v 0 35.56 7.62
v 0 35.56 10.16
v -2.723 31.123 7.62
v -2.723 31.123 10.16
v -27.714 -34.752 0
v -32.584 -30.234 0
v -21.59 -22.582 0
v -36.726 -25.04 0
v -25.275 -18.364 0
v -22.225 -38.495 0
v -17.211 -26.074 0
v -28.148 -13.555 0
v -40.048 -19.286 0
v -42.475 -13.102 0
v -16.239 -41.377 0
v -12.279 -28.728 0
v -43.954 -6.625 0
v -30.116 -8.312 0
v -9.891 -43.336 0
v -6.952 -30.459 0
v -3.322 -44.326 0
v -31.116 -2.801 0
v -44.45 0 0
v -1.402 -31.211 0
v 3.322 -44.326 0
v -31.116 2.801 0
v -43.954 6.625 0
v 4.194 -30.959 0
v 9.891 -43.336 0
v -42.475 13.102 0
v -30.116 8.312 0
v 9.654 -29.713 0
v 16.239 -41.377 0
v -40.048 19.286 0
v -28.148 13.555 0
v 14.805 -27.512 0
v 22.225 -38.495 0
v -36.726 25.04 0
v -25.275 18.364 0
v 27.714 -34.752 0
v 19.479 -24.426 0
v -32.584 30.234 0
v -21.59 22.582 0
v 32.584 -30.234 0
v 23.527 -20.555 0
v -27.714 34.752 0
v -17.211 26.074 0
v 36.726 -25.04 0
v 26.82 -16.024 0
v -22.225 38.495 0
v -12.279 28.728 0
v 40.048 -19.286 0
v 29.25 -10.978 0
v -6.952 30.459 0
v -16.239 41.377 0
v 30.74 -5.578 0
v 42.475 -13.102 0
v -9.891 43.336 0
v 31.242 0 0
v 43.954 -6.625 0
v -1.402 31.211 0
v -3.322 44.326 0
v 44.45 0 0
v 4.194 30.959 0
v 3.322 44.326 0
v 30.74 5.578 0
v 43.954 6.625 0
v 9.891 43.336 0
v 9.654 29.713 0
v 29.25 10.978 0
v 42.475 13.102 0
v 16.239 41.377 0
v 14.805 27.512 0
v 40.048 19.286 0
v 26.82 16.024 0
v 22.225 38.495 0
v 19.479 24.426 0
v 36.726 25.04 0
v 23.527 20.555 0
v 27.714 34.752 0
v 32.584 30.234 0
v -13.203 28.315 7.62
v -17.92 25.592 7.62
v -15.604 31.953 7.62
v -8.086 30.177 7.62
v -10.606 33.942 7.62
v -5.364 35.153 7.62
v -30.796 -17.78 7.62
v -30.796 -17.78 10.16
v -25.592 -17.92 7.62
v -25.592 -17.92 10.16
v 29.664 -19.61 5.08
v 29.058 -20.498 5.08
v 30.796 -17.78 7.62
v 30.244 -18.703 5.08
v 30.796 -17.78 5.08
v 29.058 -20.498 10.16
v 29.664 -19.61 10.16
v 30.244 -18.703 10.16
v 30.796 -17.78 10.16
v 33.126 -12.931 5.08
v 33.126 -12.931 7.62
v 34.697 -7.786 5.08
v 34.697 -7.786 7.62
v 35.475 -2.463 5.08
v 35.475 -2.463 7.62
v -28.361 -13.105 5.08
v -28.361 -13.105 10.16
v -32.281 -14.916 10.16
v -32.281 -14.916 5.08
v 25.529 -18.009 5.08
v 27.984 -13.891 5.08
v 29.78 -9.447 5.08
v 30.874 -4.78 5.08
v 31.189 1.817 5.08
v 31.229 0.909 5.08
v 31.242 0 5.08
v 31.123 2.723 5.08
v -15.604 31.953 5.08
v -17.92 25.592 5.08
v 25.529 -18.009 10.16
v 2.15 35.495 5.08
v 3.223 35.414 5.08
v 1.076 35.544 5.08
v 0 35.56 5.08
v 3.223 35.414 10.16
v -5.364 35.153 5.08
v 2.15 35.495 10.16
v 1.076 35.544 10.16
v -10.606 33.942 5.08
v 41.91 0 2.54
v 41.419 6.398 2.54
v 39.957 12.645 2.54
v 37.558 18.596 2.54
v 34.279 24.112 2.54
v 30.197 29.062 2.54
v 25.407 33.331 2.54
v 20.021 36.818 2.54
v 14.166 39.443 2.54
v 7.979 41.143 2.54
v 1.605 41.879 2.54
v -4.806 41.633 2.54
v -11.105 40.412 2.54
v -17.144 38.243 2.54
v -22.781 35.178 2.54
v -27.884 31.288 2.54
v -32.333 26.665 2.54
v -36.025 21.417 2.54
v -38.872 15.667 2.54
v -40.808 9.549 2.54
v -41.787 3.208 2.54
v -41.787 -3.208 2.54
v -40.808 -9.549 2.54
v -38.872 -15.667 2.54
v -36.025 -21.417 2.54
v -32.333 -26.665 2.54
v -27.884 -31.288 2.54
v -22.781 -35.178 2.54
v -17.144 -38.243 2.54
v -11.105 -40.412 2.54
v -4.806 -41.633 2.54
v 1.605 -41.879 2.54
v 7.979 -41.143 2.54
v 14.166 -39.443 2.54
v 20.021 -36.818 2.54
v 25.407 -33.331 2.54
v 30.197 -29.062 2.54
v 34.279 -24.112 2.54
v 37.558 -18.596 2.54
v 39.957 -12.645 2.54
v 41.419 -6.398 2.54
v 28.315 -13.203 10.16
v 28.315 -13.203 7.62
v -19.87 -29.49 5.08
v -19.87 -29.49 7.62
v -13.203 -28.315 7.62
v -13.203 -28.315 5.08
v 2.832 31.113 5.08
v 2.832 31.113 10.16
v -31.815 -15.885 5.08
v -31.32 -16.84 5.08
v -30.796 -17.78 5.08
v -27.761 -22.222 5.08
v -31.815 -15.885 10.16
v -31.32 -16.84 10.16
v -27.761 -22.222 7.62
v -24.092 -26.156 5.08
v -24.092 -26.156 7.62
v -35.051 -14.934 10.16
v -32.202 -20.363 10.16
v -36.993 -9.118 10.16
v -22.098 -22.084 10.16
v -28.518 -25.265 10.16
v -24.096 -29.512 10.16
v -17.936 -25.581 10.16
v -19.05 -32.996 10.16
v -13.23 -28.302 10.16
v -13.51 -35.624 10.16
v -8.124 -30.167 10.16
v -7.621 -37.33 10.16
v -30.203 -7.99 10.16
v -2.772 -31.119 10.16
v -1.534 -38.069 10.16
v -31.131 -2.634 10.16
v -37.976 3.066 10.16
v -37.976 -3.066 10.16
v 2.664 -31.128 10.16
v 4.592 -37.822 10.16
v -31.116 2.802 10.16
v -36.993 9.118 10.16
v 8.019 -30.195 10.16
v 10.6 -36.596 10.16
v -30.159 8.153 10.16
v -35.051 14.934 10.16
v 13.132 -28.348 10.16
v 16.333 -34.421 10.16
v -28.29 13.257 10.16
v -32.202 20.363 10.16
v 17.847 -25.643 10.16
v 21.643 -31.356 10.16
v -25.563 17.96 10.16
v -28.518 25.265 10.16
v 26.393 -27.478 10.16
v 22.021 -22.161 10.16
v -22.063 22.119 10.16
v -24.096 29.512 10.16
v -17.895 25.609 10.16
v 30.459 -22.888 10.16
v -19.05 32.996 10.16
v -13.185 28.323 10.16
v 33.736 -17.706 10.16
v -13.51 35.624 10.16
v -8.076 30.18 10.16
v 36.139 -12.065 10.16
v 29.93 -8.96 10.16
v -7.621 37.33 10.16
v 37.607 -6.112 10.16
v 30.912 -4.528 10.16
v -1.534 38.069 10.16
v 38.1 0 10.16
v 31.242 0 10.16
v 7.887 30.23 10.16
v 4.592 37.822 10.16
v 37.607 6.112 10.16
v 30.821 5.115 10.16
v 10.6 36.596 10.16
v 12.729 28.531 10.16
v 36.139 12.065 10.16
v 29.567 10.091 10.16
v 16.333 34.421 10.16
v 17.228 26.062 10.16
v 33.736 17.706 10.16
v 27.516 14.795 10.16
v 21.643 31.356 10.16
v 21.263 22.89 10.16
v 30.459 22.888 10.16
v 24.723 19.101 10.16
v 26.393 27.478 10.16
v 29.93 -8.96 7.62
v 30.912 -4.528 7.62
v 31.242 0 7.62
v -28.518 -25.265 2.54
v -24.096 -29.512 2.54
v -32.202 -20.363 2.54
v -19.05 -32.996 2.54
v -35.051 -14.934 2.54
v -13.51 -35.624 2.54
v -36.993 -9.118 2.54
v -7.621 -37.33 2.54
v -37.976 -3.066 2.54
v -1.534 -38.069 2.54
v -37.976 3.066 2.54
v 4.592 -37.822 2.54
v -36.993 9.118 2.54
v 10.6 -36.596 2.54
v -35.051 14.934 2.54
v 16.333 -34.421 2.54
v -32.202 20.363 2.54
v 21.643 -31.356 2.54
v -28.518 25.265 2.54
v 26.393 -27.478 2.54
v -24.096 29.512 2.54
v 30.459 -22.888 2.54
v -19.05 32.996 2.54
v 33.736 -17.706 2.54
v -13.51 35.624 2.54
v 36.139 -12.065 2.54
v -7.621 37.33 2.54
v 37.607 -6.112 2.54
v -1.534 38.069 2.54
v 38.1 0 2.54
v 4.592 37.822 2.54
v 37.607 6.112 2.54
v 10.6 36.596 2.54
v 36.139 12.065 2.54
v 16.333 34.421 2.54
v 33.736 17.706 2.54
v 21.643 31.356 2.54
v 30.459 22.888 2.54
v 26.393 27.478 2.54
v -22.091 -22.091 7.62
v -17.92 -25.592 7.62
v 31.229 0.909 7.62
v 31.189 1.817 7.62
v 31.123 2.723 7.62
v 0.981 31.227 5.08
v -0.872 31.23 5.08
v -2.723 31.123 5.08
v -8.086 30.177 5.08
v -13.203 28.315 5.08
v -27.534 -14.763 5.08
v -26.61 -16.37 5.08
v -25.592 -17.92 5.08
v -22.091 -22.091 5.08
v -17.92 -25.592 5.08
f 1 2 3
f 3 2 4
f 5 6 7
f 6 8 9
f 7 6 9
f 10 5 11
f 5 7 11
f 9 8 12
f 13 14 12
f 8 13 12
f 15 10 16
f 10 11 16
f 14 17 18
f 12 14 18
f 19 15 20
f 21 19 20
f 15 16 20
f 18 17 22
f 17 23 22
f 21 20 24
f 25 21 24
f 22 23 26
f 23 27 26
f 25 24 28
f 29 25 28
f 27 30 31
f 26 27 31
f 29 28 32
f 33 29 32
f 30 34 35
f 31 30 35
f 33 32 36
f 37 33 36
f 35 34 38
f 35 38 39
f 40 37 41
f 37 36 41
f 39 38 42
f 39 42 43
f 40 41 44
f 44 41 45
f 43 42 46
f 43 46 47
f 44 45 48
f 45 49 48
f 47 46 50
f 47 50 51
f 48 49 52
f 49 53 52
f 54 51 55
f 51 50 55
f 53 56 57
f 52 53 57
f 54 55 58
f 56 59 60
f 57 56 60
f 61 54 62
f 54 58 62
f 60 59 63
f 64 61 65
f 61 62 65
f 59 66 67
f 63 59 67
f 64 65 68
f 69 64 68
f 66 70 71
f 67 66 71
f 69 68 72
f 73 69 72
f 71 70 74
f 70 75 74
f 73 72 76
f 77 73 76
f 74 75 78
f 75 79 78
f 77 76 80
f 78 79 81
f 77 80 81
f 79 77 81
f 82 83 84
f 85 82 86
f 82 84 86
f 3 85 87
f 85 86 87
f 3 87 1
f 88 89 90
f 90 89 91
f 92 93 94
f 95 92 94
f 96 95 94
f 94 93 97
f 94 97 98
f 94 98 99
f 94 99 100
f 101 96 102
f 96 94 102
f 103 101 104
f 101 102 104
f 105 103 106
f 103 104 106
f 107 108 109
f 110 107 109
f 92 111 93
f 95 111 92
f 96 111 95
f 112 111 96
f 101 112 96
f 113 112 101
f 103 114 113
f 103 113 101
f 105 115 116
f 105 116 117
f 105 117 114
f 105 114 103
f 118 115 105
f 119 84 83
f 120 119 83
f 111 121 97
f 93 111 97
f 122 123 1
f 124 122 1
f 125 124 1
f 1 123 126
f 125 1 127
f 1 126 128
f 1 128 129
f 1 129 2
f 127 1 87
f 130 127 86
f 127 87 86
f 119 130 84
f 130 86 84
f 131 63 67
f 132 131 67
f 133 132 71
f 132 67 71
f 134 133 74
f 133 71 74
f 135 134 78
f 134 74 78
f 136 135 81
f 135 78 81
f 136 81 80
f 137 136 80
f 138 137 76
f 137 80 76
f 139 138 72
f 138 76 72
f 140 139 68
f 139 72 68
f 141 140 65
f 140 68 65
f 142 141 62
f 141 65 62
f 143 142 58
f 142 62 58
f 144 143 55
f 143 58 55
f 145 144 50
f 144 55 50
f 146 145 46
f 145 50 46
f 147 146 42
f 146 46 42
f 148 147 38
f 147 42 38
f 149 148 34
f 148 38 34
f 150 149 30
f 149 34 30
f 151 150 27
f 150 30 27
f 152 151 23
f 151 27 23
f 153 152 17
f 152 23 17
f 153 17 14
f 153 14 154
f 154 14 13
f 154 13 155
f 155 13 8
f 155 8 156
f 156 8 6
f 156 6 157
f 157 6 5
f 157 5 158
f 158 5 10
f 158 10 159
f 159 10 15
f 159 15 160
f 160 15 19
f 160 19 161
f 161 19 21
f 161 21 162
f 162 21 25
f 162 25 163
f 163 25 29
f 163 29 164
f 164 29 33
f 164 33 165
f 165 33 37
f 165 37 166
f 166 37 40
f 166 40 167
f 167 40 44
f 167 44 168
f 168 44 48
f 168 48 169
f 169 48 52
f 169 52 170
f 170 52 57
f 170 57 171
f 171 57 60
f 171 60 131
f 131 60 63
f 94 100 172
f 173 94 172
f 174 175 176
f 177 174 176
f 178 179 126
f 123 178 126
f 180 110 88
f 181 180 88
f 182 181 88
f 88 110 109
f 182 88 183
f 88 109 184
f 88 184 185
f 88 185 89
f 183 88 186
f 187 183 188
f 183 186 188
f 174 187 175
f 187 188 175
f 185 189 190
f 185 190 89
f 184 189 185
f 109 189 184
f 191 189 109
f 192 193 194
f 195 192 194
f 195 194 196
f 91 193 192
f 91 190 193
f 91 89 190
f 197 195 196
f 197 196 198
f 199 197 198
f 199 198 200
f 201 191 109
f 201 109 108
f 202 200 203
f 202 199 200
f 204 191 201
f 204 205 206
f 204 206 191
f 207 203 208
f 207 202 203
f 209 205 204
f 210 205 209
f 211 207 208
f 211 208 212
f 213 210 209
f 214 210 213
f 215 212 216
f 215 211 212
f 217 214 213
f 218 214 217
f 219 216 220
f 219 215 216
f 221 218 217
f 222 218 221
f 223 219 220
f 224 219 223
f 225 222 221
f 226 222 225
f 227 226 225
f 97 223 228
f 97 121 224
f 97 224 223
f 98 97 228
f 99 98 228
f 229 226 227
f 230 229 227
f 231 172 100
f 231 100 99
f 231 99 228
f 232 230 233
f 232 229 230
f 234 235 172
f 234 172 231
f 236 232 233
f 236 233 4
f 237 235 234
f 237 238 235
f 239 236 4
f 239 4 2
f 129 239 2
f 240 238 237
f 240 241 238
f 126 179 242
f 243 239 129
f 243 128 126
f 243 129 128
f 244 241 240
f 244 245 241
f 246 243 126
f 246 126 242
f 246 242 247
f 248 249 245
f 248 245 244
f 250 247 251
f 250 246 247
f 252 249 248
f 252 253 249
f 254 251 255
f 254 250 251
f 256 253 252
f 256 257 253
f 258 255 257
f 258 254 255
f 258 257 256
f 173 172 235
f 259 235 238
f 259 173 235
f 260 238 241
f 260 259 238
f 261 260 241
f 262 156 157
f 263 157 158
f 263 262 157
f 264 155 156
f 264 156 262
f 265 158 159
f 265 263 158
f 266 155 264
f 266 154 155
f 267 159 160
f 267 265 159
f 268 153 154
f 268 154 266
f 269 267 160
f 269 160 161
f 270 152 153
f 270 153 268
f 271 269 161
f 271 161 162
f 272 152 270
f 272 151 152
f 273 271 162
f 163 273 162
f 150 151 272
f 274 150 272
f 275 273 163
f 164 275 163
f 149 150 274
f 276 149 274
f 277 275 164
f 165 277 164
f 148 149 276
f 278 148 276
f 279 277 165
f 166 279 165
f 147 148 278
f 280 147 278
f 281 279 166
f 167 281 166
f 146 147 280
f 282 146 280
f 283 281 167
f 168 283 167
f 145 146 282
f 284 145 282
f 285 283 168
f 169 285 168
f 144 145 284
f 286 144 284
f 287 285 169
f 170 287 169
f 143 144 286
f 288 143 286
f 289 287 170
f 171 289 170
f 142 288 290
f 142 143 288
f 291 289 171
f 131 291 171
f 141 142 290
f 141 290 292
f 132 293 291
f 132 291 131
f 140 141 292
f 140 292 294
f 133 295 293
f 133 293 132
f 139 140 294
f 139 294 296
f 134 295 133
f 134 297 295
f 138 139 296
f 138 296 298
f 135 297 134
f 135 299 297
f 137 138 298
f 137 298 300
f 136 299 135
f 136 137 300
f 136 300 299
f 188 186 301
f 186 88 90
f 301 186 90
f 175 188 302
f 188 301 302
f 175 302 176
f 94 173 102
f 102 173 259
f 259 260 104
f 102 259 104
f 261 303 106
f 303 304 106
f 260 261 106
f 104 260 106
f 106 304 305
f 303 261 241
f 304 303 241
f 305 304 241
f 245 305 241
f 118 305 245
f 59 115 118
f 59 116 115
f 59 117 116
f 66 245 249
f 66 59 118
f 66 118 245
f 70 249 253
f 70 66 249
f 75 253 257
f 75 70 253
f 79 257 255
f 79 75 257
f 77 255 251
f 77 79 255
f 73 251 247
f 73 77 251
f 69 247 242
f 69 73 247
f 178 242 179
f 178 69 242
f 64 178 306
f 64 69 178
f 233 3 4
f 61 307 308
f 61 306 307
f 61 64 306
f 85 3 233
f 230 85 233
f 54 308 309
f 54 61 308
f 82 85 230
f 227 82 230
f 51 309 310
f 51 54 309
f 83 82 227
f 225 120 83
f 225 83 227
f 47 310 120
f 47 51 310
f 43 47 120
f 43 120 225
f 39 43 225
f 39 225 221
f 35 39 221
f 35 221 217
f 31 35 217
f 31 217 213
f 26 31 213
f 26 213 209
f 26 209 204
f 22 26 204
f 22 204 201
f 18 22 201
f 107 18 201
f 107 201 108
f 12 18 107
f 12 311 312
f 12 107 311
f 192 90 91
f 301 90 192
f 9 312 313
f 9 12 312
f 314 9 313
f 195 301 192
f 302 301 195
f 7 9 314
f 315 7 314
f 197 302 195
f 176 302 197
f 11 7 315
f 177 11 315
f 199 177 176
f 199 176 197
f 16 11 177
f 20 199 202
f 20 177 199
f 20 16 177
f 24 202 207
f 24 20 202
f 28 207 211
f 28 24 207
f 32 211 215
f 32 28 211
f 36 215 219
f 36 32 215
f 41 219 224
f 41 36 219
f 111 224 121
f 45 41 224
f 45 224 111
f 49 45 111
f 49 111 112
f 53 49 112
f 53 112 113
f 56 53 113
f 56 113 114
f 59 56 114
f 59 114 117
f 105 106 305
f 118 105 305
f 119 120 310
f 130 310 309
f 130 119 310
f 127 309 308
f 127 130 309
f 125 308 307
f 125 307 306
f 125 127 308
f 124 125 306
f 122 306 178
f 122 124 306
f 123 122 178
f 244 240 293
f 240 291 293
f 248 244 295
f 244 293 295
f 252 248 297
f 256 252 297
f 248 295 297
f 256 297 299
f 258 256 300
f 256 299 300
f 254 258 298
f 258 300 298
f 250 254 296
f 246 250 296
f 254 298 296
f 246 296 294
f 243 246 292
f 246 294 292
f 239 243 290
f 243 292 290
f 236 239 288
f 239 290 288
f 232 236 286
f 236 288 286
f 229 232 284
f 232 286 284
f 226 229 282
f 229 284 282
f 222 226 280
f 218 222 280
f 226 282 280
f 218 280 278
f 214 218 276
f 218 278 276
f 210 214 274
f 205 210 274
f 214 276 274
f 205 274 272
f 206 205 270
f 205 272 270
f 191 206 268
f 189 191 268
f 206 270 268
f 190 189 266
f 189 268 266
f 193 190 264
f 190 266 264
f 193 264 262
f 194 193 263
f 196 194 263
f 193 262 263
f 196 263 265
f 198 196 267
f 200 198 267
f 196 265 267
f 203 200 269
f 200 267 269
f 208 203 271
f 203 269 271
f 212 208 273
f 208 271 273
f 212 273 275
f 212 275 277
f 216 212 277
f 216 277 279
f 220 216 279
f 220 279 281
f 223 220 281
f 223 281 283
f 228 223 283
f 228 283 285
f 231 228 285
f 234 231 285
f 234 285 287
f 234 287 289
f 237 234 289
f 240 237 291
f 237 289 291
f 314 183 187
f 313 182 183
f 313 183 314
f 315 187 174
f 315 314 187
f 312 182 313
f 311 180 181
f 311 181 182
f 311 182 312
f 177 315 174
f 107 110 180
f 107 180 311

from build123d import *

# Parameters (mm, degrees)
F0_R     = 44.45
F0_R_2   = 31.242
F1_DEPTH = 2.54
F2_R     = 38.1
F2_R_2   = 31.242
F3_DEPTH = 5.08
F5_DEPTH = 2.54
F6_R     = 38.1
F6_R_2   = 31.242
F7_DEPTH = 2.54
F9_DEPTH = 2.54
F10_SIZE = 2.53999


# Not quite as in the source:
# - a fillet or chamfer is up to 0.001 mm smaller than in the source, because OpenCascade refuses the exact size


with BuildPart() as f1:
    # F0 (on Top) → F1 (new body)
    with BuildSketch(Plane.XY):
        Circle(F0_R)
        Circle(F0_R_2, mode=Mode.SUBTRACT)
    extrude(amount=F1_DEPTH)

    # F2 (on face) → F3 (join)
    with BuildSketch(Plane.XY.offset(2.54)):
        Circle(F2_R)
        Circle(F2_R_2, mode=Mode.SUBTRACT)
    extrude(amount=F3_DEPTH)

    # F4 (on face) → F5 (cut)
    with BuildSketch(Plane.XY.offset(7.62)):
        with BuildLine():
            ThreePointArc((-25.5919481677, -17.9196750245), (-27.0835882302, -15.5737539654), (-28.3607839843, -13.1045219598))
            Line((-28.3607839843, -13.1045219598), (-32.2805671366, -14.9157160518))
            ThreePointArc((-32.2805671366, -14.9157160518), (-31.5707150955, -16.3647043469), (-30.7958633586, -17.78))
            ThreePointArc((-30.7958633586, -17.78), (-26.0009342584, -24.2582979142), (-19.8703037457, -29.4904158847))
            Line((-19.8703037457, -29.4904158847), (-13.2034397333, -28.3148678826))
            ThreePointArc((-13.2034397333, -28.3148678826), (-20.0819705018, -23.9327604919), (-25.5919481677, -17.9196750245))
        make_face()
        with BuildLine():
            ThreePointArc((-17.9196750245, 25.5919481677), (-10.6853933178, 29.3578768586), (-2.7229197149, 31.1231147578))
            ThreePointArc((-2.7229197149, 31.1231147578), (0.0545275488, 31.2419524157), (2.8315430705, 31.1134203816))
            Line((2.8315430705, 31.1134203816), (3.2228945518, 35.4136492148))
            ThreePointArc((3.2228945518, 35.4136492148), (1.6131078579, 35.5233934618), (0, 35.56))
            ThreePointArc((0, 35.56), (-8.007835117, 34.646618547), (-15.6042974515, 31.9533957671))
            Line((-15.6042974515, 31.9533957671), (-17.9196750245, 25.5919481677))
        make_face()
        with BuildLine():
            Line((35.4746011972, -2.4629798824), (31.1231147578, 2.7229197149))
            ThreePointArc((31.1231147578, 2.7229197149), (31.2122645387, 1.3627569001), (31.242, 0))
            ThreePointArc((31.242, 0), (29.7795828432, -9.4466401268), (25.5292409138, -18.0088984218))
            Line((25.5292409138, -18.0088984218), (29.0576725848, -20.497933163))
            ThreePointArc((29.0576725848, -20.497933163), (29.9576072376, -19.1586891148), (30.7958633586, -17.78))
            ThreePointArc((30.7958633586, -17.78), (34.0087693754, -10.3883206328), (35.4746011972, -2.4629798824))
        make_face()
    extrude(amount=-F5_DEPTH, mode=Mode.SUBTRACT)

    # F6 (on face) → F7 (join)
    with BuildSketch(Plane.XY.offset(7.62)):
        Circle(F6_R)
        Circle(F6_R_2, mode=Mode.SUBTRACT)
    extrude(amount=F7_DEPTH)

    # F8 (on face) → F9 (cut)
    with BuildSketch(Plane.XY.offset(10.16)):
        with BuildLine():
            ThreePointArc((-25.5919481677, -17.9196750245), (-27.0835882302, -15.5737539654), (-28.3607839843, -13.1045219598))
            Line((-28.3607839843, -13.1045219598), (-32.2805671366, -14.9157160518))
            ThreePointArc((-32.2805671366, -14.9157160518), (-31.5707150955, -16.3647043469), (-30.7958633586, -17.78))
            Line((-30.7958633586, -17.78), (-25.5919481677, -17.9196750245))
        make_face()
        with BuildLine():
            ThreePointArc((28.3148678826, -13.2034397333), (27.0290606814, -15.6681984503), (25.5292409138, -18.0088984218))
            Line((25.5292409138, -18.0088984218), (29.0576725848, -20.497933163))
            ThreePointArc((29.0576725848, -20.497933163), (29.9576072376, -19.1586891148), (30.7958633586, -17.78))
            Line((30.7958633586, -17.78), (28.3148678826, -13.2034397333))
        make_face()
        with BuildLine():
            Line((0, 35.56), (-2.7229197149, 31.1231147578))
            ThreePointArc((-2.7229197149, 31.1231147578), (0.0545275488, 31.2419524157), (2.8315430705, 31.1134203816))
            Line((2.8315430705, 31.1134203816), (3.2228945518, 35.4136492148))
            ThreePointArc((3.2228945518, 35.4136492148), (1.6131078579, 35.5233934618), (0, 35.56))
        make_face()
    extrude(amount=-F9_DEPTH, mode=Mode.SUBTRACT)

    # F10 (size 2.54 in the source; OpenCascade refuses exactly that, so slightly less here)
    f10_edges = [f1.edges().sort_by_distance(p)[0] for p in [
        (-44.45, 0, 2.54),
    ]]
    chamfer(f10_edges, length=F10_SIZE)


solid = f1.part
